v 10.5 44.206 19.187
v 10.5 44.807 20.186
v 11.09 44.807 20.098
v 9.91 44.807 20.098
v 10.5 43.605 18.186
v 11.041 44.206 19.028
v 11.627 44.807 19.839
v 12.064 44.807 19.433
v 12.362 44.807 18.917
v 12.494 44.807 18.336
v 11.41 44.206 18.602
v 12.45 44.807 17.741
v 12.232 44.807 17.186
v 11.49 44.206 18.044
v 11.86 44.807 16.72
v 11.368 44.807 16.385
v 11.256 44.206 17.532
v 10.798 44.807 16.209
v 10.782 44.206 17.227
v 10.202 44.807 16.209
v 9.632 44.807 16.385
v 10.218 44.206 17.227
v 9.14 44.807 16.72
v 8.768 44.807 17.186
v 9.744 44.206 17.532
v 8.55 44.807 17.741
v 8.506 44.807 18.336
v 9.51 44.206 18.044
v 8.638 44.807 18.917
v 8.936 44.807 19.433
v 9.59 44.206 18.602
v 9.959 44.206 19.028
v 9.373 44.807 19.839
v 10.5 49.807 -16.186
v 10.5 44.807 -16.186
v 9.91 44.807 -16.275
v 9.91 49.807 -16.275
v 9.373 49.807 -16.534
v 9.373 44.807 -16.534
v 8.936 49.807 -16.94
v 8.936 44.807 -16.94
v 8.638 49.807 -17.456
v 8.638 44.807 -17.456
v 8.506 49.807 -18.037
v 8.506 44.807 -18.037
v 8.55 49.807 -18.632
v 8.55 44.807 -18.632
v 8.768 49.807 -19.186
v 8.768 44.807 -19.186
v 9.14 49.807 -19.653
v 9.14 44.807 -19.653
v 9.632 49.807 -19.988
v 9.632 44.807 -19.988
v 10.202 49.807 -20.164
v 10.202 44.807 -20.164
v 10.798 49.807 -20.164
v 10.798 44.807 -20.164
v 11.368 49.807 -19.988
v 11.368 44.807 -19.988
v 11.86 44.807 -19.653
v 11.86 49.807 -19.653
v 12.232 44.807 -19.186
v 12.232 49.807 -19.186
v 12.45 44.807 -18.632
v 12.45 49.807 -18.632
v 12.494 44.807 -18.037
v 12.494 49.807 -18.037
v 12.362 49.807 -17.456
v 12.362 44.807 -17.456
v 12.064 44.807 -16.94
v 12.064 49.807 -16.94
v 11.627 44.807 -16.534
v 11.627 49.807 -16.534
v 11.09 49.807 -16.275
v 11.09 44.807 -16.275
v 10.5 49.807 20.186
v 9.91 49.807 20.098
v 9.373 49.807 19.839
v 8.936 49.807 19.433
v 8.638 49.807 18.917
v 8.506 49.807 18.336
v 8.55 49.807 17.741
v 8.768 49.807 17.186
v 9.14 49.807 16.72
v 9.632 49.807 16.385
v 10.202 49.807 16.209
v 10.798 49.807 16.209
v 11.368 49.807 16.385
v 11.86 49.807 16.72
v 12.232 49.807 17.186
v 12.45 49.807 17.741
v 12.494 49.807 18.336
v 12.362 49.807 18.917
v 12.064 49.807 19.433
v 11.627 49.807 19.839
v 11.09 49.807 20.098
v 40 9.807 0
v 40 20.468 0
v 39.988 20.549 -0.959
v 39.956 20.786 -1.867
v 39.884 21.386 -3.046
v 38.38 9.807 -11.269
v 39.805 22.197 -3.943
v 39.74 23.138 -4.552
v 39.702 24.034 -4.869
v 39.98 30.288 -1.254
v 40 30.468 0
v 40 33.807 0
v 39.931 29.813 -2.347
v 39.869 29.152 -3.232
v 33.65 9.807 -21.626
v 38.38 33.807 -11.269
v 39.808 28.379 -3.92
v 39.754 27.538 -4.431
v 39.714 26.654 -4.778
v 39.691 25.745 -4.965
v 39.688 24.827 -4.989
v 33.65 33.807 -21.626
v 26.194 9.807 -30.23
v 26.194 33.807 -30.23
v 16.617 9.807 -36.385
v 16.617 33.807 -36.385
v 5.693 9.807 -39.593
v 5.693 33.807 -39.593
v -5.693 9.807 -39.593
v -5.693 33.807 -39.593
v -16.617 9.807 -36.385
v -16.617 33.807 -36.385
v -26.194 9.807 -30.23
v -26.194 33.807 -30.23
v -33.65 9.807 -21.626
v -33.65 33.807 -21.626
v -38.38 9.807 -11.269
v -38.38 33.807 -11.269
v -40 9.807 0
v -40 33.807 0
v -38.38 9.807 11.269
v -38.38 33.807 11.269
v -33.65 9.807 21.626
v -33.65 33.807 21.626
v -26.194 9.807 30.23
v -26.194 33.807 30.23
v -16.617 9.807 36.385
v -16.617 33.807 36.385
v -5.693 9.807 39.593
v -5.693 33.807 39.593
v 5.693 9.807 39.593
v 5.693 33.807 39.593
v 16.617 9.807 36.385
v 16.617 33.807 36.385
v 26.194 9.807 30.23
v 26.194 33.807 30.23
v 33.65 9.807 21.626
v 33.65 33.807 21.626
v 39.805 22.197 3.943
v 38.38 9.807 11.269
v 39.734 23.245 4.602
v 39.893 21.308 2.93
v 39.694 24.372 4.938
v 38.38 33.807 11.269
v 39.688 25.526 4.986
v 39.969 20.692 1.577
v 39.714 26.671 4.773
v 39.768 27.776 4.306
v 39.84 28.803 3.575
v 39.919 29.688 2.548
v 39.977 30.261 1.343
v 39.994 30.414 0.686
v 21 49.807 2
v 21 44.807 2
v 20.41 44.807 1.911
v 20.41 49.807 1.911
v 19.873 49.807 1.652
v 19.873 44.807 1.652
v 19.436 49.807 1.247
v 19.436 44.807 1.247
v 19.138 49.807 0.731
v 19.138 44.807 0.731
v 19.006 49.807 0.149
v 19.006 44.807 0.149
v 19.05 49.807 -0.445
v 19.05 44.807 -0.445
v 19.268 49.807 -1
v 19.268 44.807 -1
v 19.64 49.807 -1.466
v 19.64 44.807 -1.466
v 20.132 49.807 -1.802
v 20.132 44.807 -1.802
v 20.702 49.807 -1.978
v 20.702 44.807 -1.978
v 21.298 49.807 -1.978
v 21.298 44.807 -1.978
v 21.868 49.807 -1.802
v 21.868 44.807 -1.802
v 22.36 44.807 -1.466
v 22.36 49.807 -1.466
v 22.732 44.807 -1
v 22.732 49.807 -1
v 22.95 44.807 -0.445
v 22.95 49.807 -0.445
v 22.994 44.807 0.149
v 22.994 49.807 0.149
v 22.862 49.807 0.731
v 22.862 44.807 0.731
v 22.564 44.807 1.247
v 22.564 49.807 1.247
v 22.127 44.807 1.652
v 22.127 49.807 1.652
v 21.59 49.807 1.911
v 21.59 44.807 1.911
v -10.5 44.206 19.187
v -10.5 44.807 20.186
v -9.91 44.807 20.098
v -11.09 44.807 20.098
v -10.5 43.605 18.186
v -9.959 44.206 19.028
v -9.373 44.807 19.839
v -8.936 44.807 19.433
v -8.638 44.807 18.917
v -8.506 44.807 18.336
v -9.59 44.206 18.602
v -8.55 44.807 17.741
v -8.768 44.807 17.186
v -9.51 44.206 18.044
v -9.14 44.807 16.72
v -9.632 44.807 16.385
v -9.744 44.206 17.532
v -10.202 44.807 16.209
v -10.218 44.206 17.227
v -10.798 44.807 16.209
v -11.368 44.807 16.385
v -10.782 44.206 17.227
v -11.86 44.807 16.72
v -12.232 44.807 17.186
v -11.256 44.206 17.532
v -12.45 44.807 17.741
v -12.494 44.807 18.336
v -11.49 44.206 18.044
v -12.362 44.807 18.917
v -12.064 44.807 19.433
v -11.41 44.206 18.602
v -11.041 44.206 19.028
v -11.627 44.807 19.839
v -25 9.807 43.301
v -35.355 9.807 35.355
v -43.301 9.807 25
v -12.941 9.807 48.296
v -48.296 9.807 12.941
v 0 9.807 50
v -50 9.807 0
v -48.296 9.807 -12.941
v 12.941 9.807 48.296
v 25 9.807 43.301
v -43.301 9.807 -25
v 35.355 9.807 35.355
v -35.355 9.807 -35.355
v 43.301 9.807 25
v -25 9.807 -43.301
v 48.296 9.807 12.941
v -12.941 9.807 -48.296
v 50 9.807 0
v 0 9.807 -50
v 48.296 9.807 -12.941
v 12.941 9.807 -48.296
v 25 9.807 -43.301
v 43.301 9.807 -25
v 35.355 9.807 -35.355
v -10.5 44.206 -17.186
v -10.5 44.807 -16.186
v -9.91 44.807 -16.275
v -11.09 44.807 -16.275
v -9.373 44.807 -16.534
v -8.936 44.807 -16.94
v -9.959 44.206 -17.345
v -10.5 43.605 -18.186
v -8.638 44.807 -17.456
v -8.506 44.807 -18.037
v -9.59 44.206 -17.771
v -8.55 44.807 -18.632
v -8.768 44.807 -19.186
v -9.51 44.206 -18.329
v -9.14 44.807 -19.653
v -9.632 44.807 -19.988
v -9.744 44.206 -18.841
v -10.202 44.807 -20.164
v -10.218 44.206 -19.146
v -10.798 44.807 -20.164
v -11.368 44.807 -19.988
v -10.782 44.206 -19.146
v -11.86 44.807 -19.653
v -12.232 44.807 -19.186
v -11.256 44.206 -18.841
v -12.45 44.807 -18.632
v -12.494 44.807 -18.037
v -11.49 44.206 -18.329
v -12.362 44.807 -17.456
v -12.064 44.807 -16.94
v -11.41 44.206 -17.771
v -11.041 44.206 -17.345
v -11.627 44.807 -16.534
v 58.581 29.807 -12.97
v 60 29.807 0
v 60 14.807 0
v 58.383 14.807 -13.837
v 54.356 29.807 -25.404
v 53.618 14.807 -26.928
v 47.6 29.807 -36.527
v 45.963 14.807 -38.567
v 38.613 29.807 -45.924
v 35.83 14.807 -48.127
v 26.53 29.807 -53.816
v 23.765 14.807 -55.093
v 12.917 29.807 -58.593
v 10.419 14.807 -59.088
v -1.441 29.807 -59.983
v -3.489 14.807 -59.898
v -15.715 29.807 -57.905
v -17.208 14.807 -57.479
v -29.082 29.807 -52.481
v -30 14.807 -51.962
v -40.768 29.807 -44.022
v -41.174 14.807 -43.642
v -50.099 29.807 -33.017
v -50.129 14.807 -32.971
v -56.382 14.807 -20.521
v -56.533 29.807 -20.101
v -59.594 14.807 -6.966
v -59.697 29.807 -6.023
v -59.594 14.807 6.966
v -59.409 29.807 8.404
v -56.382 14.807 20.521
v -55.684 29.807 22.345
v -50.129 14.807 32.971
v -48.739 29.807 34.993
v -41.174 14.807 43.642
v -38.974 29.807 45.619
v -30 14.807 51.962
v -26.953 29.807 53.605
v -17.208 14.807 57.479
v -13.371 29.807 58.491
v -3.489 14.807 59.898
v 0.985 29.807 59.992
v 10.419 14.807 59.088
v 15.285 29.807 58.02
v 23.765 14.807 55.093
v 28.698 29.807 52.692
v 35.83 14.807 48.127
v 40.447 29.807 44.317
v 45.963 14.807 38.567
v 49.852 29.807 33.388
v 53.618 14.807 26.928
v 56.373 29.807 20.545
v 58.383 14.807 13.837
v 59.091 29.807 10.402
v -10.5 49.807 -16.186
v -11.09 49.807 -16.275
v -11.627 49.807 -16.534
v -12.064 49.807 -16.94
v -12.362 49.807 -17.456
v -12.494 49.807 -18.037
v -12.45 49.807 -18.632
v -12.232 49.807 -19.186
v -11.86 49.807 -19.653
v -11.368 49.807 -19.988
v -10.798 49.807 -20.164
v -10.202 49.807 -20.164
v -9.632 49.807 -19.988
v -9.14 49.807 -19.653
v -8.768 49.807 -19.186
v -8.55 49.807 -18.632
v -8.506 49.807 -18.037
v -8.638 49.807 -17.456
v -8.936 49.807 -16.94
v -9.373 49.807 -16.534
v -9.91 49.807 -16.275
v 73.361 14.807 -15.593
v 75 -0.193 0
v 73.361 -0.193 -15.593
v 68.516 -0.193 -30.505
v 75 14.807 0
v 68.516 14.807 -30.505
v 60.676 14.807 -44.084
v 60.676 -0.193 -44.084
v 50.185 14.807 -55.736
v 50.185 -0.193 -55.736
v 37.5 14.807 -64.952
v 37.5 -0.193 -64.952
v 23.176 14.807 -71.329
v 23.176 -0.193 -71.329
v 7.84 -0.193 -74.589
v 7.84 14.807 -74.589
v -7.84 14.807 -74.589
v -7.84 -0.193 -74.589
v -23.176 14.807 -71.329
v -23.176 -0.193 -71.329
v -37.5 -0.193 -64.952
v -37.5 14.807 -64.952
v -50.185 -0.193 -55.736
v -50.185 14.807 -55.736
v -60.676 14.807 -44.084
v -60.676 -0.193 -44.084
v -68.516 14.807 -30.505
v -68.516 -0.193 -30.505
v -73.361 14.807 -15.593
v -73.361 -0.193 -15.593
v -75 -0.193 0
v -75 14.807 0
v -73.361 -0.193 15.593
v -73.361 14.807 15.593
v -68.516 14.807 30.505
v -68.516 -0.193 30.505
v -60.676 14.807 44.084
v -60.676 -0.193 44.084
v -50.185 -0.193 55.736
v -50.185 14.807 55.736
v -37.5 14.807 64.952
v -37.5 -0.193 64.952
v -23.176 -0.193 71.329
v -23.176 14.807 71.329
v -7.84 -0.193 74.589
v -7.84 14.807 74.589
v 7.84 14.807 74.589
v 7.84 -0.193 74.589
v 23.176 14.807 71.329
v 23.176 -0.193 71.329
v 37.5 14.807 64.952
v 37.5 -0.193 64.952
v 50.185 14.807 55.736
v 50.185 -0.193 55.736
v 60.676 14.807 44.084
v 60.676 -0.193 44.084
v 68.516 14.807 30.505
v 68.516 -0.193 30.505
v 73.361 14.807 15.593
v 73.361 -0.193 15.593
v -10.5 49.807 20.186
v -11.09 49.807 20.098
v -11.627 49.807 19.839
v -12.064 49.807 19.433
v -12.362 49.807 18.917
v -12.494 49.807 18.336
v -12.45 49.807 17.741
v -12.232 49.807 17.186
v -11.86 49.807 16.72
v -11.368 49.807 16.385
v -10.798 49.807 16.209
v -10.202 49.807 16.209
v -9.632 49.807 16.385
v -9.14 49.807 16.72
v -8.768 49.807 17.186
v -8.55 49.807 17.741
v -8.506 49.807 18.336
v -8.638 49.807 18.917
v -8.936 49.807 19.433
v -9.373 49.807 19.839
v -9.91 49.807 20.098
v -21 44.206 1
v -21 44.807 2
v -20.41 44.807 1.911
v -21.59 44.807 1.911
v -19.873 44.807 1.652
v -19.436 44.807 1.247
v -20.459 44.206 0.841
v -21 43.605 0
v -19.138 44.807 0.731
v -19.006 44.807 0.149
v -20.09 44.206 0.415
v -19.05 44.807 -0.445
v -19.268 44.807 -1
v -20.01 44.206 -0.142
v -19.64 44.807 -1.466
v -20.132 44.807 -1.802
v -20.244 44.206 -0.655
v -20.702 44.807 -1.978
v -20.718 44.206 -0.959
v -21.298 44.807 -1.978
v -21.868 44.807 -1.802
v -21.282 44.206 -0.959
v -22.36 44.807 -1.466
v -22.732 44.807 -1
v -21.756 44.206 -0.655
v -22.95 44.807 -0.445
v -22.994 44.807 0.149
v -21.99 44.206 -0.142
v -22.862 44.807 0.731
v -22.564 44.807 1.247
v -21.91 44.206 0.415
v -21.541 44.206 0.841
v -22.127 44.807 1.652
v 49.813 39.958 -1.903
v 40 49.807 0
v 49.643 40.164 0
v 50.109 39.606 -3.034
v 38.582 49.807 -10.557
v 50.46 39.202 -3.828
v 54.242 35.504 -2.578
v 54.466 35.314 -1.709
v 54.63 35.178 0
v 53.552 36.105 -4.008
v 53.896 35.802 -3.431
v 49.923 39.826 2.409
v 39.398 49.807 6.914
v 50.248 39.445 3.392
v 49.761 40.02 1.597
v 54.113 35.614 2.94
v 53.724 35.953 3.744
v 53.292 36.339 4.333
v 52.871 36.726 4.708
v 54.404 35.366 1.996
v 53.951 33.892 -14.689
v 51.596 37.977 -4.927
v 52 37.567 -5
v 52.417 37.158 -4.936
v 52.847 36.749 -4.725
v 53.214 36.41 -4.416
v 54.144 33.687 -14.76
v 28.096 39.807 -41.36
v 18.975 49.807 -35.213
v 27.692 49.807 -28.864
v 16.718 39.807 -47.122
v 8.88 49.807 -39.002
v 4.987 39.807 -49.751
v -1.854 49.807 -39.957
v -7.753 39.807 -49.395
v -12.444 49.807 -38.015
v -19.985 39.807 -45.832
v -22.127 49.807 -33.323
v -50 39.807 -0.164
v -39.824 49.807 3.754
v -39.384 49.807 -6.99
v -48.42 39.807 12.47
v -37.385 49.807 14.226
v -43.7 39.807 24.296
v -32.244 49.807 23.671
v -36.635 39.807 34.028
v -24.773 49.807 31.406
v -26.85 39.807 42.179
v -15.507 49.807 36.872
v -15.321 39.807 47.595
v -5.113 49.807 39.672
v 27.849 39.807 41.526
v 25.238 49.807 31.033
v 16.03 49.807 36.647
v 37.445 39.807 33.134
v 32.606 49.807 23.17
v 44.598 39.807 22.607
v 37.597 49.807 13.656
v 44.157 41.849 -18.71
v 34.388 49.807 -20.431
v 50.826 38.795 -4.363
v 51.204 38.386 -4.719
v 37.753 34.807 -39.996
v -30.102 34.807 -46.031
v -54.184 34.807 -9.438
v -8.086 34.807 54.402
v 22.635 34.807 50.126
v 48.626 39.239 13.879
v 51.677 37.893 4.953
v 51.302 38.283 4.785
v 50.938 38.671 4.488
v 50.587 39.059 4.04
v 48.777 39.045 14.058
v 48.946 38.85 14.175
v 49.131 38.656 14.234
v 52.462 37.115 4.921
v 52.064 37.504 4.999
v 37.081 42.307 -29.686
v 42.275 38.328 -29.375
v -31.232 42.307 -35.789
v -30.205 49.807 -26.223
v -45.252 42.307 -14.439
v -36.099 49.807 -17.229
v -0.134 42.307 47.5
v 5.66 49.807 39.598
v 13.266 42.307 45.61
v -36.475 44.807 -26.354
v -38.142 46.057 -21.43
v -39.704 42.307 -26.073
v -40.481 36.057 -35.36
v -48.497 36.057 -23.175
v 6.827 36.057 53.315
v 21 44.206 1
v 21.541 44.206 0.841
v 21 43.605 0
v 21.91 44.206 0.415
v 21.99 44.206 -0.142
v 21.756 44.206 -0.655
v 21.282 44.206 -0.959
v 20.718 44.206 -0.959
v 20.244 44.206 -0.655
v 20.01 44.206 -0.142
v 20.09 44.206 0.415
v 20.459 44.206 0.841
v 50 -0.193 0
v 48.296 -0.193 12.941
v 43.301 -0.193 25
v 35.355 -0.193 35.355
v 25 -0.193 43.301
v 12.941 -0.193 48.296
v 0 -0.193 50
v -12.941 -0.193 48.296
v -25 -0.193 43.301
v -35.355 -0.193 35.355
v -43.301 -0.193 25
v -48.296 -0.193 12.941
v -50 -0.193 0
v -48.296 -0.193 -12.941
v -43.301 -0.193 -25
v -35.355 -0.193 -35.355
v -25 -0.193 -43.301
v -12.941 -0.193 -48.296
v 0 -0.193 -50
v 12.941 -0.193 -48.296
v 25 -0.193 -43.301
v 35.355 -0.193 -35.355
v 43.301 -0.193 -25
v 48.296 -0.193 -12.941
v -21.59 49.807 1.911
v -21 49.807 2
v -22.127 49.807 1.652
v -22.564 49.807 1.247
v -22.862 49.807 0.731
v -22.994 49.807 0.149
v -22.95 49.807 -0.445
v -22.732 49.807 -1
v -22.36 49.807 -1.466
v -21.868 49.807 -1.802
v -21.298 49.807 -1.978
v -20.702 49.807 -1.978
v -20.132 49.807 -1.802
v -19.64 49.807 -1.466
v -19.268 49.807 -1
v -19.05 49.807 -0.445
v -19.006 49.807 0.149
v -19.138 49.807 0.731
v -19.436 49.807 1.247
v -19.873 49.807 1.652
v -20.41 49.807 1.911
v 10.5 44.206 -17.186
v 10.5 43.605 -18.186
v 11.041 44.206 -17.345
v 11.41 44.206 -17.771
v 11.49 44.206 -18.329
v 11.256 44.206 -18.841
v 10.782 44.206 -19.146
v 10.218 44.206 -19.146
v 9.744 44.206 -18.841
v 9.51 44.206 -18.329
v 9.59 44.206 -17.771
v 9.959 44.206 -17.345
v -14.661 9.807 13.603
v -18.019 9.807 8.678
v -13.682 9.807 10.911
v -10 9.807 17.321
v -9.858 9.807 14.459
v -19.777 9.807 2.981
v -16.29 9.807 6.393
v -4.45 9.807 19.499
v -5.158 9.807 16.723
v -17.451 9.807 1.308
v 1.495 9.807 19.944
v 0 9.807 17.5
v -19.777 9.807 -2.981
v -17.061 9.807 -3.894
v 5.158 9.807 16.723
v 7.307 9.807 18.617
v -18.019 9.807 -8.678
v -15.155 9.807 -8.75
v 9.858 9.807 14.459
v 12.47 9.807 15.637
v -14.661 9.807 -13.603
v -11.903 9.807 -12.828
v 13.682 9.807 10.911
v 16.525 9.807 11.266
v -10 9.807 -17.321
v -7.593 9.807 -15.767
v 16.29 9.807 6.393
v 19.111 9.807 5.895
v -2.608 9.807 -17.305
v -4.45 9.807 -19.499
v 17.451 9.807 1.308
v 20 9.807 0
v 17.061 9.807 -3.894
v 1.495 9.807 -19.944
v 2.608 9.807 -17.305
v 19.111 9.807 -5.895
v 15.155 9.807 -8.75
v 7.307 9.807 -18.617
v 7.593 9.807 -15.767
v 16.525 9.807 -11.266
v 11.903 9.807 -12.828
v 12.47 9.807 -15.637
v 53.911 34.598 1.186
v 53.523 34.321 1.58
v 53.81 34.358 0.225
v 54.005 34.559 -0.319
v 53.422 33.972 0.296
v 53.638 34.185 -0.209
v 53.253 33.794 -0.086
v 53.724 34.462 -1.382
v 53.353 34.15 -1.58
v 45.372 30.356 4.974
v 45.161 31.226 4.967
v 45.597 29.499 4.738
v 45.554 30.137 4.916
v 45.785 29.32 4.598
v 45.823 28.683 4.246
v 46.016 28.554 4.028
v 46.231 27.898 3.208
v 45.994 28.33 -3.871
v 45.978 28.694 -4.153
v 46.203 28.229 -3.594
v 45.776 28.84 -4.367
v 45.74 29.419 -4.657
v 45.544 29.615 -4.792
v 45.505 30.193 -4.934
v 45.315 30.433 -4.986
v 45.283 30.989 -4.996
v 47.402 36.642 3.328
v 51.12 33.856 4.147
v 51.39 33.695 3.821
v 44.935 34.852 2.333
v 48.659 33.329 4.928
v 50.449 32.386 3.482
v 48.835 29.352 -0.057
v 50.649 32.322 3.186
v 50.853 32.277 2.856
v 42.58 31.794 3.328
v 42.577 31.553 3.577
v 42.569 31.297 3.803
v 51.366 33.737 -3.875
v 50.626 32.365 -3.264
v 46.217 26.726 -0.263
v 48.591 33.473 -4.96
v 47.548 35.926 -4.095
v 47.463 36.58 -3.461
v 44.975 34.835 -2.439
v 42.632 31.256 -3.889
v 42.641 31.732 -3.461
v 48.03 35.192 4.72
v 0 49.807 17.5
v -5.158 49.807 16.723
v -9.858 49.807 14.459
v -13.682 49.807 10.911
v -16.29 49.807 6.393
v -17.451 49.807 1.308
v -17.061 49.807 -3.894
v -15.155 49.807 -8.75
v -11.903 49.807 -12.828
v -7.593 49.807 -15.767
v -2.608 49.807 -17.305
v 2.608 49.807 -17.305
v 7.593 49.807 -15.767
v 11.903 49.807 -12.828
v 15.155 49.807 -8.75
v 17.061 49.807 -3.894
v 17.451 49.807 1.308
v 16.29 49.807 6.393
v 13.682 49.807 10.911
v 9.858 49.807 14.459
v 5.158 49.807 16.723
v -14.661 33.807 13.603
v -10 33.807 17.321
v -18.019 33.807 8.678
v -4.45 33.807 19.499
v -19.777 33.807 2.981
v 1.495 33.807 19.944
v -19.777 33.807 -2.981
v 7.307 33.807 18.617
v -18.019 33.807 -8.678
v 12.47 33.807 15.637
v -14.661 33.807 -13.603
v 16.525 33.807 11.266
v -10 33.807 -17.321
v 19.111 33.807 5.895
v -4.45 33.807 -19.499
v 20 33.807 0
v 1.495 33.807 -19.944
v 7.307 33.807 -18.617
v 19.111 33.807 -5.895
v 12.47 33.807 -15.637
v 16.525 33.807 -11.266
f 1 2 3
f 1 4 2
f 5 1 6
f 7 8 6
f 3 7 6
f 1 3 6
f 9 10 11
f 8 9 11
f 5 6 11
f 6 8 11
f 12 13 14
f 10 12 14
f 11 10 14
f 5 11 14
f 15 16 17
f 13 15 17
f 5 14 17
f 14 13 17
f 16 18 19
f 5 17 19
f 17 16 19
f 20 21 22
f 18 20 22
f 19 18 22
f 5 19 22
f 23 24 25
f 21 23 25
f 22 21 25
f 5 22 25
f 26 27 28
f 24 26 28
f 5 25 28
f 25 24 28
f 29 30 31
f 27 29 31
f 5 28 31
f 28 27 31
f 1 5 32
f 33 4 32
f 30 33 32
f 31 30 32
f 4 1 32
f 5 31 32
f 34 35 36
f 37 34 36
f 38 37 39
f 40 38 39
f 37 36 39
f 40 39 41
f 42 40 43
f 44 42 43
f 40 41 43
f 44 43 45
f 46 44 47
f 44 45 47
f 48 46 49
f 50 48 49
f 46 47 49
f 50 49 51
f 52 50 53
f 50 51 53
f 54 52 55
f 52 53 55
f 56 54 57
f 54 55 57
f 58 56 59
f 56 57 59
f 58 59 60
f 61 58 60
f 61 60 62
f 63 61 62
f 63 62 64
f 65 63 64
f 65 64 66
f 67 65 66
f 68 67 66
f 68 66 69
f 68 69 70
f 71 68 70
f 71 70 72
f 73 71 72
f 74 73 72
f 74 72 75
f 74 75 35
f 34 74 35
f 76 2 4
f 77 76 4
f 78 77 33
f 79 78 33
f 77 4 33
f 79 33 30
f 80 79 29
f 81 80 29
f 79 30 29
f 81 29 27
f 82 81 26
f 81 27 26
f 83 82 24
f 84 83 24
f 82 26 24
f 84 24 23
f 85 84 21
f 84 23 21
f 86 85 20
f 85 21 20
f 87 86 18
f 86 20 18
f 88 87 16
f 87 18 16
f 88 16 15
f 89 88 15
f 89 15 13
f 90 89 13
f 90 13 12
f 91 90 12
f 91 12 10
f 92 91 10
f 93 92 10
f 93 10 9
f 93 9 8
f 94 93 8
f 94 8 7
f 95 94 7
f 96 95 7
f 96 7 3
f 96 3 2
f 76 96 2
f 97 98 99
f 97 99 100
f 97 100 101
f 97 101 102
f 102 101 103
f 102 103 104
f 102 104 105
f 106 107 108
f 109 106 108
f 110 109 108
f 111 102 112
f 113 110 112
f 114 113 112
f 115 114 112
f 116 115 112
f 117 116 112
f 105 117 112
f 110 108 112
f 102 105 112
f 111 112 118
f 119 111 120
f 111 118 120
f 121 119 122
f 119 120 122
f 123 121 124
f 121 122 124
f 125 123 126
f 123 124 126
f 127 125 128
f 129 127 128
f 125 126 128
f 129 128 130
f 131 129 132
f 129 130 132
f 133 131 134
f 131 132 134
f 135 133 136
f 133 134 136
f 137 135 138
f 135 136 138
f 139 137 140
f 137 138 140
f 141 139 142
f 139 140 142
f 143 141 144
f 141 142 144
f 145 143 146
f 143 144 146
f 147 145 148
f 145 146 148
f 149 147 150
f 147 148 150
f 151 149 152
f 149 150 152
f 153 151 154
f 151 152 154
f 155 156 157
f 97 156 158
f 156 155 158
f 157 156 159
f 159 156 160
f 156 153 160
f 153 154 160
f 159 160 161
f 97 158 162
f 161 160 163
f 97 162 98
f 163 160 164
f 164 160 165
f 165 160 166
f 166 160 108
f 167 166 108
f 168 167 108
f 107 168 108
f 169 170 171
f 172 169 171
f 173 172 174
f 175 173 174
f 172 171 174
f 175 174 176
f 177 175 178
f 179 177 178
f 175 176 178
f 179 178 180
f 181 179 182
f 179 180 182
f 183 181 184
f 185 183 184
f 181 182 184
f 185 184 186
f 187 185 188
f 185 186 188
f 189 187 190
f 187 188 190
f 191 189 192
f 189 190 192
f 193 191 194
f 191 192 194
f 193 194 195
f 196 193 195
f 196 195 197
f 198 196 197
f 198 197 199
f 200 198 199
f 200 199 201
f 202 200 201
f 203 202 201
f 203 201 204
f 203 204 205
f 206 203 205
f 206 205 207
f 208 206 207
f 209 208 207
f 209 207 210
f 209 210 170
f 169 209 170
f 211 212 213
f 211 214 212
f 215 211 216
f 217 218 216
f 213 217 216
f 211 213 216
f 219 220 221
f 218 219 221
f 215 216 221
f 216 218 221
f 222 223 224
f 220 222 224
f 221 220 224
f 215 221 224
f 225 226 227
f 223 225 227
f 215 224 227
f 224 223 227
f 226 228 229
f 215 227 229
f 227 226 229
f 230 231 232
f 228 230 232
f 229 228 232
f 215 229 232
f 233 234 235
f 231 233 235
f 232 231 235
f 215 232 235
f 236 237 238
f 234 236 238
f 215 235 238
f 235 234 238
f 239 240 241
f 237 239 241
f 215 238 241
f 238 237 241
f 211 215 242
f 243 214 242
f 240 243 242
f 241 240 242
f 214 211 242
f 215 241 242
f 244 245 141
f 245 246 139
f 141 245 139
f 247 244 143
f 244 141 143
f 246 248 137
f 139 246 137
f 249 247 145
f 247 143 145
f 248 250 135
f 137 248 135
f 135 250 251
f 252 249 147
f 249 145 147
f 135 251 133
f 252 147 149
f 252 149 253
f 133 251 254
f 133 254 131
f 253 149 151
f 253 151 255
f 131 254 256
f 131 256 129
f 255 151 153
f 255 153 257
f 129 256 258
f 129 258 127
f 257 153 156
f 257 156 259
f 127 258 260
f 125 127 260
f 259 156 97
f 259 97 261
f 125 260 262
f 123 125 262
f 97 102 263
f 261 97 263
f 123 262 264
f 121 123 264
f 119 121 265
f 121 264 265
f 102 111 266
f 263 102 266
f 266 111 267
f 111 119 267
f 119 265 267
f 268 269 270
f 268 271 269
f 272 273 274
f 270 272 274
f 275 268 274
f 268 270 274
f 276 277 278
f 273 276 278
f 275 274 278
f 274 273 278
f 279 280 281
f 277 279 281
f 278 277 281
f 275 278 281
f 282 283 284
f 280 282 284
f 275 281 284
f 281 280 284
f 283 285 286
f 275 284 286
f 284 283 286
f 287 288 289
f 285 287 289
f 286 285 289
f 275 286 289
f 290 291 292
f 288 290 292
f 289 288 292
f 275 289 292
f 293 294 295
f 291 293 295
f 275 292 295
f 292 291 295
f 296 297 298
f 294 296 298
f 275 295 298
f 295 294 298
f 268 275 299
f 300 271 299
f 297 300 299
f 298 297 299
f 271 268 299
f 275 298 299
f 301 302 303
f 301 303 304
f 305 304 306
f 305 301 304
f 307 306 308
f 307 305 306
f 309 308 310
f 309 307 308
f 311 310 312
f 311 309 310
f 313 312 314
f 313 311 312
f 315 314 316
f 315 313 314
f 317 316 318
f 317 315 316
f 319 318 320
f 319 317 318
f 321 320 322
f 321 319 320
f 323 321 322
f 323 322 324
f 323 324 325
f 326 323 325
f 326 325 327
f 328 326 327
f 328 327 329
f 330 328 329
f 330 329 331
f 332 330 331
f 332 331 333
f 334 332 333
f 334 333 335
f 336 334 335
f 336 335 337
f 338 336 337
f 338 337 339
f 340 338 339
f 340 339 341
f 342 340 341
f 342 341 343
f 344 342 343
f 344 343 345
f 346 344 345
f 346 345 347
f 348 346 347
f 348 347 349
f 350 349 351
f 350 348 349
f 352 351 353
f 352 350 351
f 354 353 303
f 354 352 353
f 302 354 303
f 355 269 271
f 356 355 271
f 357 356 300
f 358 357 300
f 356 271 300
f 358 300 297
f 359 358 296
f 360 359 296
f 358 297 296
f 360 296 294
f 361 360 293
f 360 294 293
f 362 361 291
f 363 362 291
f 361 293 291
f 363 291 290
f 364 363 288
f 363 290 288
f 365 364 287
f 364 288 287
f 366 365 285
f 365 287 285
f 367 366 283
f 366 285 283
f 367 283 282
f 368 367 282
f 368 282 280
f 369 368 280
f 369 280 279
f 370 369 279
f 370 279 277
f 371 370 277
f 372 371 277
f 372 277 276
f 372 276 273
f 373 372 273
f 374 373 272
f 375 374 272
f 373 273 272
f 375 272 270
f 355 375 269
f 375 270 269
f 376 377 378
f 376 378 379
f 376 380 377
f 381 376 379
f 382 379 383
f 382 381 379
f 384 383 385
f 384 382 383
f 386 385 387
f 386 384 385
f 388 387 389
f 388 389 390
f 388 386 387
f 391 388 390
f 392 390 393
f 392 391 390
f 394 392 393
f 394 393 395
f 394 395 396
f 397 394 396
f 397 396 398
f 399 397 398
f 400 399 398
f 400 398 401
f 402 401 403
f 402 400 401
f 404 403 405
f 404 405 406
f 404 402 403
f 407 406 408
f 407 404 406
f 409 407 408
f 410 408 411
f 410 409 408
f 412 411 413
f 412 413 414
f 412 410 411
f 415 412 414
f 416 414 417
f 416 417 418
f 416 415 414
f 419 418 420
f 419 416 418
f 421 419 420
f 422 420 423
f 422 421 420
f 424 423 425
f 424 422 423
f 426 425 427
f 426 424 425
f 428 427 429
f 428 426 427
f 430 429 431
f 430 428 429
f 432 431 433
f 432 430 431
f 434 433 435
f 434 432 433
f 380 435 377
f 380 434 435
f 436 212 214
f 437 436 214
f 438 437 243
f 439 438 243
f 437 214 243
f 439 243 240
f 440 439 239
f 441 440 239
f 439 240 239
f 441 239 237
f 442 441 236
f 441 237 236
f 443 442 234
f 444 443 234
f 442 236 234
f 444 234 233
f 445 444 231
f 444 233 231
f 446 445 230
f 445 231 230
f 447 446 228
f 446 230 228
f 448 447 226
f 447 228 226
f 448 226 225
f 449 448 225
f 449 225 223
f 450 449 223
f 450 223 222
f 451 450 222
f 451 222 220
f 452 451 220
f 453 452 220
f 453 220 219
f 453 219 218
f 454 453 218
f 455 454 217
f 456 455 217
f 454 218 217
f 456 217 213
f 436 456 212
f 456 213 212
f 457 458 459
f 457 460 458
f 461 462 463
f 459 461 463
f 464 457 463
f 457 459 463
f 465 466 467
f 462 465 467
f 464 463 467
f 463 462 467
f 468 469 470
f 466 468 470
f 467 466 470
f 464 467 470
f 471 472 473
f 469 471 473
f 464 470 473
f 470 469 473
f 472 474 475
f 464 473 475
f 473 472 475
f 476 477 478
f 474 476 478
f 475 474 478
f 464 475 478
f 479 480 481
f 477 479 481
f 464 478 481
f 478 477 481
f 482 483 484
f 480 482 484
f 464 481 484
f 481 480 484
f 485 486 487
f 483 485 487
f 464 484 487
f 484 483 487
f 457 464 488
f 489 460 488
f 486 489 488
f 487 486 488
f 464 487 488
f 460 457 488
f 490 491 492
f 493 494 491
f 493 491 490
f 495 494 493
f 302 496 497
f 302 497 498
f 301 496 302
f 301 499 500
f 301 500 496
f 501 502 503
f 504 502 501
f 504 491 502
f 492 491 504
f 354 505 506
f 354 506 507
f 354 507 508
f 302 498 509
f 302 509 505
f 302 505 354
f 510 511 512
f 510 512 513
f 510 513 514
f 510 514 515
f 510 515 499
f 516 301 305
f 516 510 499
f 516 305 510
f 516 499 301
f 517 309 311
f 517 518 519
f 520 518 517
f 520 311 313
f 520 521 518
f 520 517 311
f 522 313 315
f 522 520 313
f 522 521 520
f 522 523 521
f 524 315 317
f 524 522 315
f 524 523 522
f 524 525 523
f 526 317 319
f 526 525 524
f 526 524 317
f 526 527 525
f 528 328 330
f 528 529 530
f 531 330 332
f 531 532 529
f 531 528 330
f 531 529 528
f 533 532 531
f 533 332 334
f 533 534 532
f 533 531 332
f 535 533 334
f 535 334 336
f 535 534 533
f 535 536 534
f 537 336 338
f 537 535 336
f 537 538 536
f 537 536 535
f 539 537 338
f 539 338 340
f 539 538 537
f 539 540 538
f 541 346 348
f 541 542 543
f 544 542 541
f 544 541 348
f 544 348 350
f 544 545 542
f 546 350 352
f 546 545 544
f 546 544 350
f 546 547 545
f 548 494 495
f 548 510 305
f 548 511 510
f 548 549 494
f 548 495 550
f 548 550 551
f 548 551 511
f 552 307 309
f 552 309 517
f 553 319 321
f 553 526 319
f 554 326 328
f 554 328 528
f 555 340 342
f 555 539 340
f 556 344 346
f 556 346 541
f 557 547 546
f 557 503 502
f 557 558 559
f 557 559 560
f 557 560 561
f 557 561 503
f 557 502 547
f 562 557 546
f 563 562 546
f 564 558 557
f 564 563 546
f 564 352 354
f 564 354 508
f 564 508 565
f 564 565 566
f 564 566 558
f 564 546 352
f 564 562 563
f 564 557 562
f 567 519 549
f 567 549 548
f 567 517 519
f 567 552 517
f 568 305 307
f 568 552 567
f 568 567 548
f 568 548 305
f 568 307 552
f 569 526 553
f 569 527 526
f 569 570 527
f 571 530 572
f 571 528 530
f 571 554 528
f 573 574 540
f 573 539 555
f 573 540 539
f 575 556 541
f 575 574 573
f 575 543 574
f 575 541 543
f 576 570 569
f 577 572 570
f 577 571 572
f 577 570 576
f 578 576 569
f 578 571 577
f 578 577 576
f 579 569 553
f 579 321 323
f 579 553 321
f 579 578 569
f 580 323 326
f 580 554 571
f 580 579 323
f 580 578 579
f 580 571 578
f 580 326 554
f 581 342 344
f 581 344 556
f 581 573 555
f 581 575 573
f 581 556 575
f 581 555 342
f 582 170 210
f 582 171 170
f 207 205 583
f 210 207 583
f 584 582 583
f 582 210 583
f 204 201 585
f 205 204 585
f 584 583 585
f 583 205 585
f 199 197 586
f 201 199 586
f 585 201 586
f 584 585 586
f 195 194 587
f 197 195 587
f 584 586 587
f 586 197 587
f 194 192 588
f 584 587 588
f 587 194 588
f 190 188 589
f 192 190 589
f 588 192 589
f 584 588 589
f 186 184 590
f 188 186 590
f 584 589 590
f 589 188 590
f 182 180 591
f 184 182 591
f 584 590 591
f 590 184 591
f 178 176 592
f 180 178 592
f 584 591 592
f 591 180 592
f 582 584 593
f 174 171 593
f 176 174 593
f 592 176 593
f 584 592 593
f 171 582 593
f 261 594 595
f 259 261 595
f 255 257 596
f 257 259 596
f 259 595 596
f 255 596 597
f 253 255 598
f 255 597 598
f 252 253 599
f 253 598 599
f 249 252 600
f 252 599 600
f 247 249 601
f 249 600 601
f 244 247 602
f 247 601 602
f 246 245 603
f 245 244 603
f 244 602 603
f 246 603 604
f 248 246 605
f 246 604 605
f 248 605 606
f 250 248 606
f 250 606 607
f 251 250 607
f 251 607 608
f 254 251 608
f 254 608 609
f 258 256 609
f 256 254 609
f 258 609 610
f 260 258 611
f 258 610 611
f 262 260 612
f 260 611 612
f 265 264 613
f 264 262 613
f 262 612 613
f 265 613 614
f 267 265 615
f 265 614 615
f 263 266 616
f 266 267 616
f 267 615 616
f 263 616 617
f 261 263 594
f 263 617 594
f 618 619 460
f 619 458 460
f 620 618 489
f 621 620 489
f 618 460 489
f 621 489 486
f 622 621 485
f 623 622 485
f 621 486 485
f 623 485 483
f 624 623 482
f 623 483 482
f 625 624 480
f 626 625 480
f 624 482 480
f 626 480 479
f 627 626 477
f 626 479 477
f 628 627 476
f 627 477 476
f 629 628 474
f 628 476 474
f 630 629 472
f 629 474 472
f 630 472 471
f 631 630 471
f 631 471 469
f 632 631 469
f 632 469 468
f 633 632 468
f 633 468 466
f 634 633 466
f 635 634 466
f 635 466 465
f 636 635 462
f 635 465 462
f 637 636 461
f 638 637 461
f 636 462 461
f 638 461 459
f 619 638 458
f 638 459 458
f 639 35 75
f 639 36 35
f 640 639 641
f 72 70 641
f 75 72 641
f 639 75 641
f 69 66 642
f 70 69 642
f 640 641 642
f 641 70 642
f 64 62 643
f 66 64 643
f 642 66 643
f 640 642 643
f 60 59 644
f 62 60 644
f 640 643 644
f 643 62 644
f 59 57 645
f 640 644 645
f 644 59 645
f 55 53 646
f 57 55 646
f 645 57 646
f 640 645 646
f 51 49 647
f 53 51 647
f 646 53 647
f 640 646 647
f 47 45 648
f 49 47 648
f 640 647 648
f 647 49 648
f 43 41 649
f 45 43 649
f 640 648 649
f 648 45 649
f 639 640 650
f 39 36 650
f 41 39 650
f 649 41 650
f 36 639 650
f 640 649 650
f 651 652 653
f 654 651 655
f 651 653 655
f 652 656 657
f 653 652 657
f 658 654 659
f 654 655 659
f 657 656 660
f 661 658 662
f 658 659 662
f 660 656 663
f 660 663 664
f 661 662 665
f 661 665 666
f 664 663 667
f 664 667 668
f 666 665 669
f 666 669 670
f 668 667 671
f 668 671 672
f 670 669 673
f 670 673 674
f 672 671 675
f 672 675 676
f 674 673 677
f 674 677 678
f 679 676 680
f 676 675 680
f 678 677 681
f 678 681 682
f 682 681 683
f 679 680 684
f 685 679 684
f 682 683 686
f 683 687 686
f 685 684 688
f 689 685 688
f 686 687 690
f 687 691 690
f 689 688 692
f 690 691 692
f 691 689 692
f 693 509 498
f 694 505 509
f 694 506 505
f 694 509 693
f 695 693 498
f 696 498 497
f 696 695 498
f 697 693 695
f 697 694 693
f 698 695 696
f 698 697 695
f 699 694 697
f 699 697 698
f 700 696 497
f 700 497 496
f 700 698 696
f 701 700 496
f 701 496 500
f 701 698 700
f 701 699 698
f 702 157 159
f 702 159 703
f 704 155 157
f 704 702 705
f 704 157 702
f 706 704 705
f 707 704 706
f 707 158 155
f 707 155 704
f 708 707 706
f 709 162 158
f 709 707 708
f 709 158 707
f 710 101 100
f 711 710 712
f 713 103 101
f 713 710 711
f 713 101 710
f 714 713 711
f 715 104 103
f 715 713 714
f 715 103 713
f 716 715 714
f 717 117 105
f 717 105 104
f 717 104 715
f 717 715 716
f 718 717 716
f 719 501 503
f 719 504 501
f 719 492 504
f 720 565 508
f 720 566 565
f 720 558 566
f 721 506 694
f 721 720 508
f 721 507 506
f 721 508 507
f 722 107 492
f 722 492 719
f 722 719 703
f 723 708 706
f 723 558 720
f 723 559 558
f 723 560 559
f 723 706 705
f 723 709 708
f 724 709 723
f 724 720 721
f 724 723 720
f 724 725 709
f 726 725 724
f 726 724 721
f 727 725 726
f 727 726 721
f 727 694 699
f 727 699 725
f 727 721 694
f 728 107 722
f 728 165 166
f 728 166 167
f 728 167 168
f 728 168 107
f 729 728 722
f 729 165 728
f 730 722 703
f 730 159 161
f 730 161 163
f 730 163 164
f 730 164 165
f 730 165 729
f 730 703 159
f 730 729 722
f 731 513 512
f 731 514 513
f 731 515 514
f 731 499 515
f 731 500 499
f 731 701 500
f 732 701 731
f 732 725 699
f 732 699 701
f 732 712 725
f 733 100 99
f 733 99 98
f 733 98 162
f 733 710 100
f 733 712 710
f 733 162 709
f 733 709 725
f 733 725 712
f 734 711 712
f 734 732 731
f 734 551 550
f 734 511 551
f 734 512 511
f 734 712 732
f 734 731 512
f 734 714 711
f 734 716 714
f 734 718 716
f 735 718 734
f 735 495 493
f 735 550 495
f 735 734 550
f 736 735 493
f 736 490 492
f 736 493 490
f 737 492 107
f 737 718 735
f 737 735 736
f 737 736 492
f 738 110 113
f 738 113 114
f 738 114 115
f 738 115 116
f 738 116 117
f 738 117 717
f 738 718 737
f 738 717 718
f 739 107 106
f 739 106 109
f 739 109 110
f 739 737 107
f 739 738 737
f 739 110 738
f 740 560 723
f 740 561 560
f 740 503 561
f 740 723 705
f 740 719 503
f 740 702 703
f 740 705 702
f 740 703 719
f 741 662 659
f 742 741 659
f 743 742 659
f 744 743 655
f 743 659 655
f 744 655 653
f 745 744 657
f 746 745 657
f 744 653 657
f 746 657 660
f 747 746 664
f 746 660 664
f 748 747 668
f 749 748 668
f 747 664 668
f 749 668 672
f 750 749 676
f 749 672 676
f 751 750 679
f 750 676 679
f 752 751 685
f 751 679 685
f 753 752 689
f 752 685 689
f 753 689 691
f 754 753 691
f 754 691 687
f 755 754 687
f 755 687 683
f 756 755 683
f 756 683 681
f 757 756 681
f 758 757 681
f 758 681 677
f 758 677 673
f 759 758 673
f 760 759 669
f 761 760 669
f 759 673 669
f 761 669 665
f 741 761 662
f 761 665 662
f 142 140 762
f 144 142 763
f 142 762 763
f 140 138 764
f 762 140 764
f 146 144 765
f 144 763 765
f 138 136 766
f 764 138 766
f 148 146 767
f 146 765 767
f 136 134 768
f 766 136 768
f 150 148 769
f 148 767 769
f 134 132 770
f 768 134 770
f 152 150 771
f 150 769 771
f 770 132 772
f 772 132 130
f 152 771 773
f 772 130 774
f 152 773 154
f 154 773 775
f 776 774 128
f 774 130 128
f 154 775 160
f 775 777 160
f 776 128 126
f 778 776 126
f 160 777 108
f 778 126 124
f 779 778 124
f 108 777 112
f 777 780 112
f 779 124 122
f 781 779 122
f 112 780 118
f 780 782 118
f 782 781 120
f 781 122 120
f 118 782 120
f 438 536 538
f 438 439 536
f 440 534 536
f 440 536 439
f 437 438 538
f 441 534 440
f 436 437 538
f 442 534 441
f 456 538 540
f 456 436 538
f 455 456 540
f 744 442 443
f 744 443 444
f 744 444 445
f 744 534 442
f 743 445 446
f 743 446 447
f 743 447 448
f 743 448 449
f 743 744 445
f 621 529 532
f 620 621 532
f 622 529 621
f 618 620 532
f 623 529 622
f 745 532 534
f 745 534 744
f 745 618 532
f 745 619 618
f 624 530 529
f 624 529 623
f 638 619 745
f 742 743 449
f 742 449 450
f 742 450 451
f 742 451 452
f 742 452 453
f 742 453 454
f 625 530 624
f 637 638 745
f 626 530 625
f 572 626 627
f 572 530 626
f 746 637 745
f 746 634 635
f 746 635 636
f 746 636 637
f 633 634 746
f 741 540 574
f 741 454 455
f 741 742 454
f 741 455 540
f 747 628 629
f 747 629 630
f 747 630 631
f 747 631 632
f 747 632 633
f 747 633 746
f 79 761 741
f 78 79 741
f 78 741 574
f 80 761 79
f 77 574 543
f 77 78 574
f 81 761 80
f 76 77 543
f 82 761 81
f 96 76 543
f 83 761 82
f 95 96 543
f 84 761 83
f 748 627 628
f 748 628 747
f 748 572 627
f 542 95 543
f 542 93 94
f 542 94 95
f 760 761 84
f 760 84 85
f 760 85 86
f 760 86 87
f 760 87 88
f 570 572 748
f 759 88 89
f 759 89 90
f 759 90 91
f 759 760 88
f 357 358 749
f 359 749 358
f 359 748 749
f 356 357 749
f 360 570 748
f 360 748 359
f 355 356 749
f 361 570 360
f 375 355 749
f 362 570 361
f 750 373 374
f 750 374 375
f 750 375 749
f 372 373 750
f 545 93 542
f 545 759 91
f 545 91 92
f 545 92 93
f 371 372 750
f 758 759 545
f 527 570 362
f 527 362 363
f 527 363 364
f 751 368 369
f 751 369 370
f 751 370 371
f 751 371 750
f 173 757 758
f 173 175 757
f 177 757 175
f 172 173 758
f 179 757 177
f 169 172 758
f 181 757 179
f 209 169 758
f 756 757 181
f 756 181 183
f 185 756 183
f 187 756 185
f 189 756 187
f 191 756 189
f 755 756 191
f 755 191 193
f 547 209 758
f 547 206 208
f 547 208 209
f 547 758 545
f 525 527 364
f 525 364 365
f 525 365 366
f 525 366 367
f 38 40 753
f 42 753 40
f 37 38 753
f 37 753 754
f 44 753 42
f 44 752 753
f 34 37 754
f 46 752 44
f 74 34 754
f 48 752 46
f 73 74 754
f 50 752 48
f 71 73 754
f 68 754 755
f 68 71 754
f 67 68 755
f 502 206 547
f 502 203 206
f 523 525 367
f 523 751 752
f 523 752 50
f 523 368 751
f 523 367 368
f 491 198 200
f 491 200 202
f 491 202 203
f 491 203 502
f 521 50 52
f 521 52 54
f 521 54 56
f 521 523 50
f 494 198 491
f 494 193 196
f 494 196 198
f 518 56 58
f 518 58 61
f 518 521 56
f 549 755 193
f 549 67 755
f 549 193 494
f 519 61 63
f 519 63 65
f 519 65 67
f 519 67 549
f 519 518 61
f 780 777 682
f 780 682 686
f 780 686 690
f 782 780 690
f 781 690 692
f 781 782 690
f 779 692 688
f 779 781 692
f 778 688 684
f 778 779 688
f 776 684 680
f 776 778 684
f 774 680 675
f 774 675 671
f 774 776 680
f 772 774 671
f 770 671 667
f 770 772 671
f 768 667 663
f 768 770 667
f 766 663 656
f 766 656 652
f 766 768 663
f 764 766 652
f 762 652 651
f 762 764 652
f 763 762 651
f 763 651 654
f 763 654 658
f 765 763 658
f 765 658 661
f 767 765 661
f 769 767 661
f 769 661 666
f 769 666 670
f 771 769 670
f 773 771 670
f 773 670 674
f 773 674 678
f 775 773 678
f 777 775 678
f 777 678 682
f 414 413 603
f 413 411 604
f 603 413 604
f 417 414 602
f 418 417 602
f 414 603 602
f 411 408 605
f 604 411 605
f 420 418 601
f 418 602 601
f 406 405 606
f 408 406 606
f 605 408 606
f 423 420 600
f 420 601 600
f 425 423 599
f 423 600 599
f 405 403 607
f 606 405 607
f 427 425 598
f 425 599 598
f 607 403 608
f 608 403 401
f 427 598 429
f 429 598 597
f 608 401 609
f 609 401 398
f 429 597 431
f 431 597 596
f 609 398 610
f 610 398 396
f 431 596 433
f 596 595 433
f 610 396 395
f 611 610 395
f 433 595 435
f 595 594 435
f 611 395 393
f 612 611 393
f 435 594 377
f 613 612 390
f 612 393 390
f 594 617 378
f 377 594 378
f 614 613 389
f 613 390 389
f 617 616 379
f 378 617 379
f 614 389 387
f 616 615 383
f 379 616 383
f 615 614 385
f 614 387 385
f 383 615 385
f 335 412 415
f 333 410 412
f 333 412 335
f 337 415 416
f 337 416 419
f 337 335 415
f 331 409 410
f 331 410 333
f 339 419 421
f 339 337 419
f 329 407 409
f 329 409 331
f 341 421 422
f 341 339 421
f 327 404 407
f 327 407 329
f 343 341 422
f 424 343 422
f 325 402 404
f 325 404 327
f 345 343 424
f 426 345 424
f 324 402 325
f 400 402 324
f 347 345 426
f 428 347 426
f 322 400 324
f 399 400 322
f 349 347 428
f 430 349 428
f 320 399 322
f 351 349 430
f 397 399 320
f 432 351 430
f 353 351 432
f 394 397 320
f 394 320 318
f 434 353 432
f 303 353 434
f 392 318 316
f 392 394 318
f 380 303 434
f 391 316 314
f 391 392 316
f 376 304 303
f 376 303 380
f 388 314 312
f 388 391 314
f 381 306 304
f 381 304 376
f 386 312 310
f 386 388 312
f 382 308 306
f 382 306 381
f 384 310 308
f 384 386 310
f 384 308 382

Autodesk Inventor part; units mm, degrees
ref_plane "XZ Plane" through (0, 0, 0) normal (0, 1, 0) x (-1, 0, 0)
sketch "Sketch1" plane through (0, 0, 0) normal (0, 0, 1) x (1, 0, 0)
  line L0 (0, 0) -> (0, 66)
  line L1 (75, -0.1929) -> (75, 14.8071)
  line L2 (-21.5975, 0) -> (0, 0)
  line L3 (46.9201, 0) -> (53.1744, 0)
  line L4 (75, 14.8071) -> (60, 14.8071)
  line L5 (60, 14.8071) -> (60, 34.8071)
  line L6 (0, 33.8071) -> (0, 49.8071)
  line L7 (0, 49.8071) -> (35, 49.8071)
  line L8 (46.9201, 9.8071) -> (40, 9.8071)
  line L9 (40, 9.8071) -> (40, 33.8071)
  line L10 (60, 34.8071) -> (60, 49.8071)
  line L11 (60, 49.8071) -> (35, 49.8071)
  line L12 (46.9201, 9.8071) -> (50, 9.8071)
  line L13 (50, 9.8071) -> (50, -0.1929)
  line L14 (50, -0.1929) -> (75, -0.1929)
  line L15 (0, 33.8071) -> (0, 9.8071)
  line L16 (0, 9.8071) -> (20, 9.8071)
  line L17 (20, 9.8071) -> (20, 33.8071)
  line L18 (20, 33.8071) -> (40, 33.8071)
  dimension "d0" = 66
  dimension "d2" = 150
  dimension "d4" = 15
  dimension "d5" = 20
  dimension "d15" = 35
  dimension "d16" = 70
  dimension "d84" = 100
  dimension "d92" = 50
  dimension "d132" = 15
  dimension "d134" = 10
  dimension "d136" = 40
  dimension "d137" = 20
revolve "Revolution1" add sketch "Sketch1" angle 360 about axis through (0, 0, 0) along (0, 1, 0)
chamfer "Chamfer1" distance 20 angle 45 1 edges at (-60, 49.8071, 0)
ref_plane "Work Plane1" through (60, 0, 0) normal (1, 0, 0) x (0, 1, 0)
sketch "Sketch10" plane through (0, 49.8071, 0) normal (0, 1, 0) x (1, 0, 0)
  circle A0 centre (0, 0) radius 16
  dimension "d54" = 32
hole "Hole2" at (0, 49.8071, 0) direction (0, -1, 0) diameter 35 end through all
ref_plane "Work Plane2" through (60, 0, 0) normal (1, 0, 0) x (0, 1, 0)
sketch "Sketch14" plane through (60, 0, 0) normal (1, 0, 0) x (0, 1, 0)
  circle A0 centre (45.5775, 0) radius 5
  point P0 (0, 0)
  dimension "d89" = 10
sketch "Sketch15" plane through (0, 0, 0) normal (0, 0, 1) x (1, 0, 0)
  line L0 (59.908, 45.3055) -> (36.1068, 21.3737)
  point P0 (0, 0)
sweep "Sweep4" cut profiles "Sketch14" path "Sketch15"
sketch "Sketch18" plane through (0, 49.8071, 0) normal (0, 1, 0) x (1, 0, 0)
  point P0 (0, 0)
sketch "Sketch19" plane through (0, 49.8071, 0) normal (0, 1, 0) x (1, 0, 0)
  circle A0 centre (-21, 0) radius 2
  circle A1 centre (-10.5, -18.1865) radius 2
  circle A2 centre (10.5, -18.1865) radius 2
  circle A3 centre (21, 0) radius 2
  circle A4 centre (10.5, 18.1865) radius 2
  circle A5 centre (-10.5, 18.1865) radius 2
  point P0 (0, 0)
  dimension "d144" = 4
  dimension "d145" = 21
  dimension "d148" = 360
hole "Hole5" at (-21, 49.8071, 0) at (-10.5, 49.8071, -18.1865) at (21, 49.8071, 0) at (10.5, 49.8071, 18.1865) at (-10.5, 49.8071, 18.1865) at (10.5, 49.8071, -18.1865) direction (0, -1, 0) diameter 4 depth 5 tip angle 118
thread "Thread21"
thread "Thread22"
thread "Thread23"
thread "Thread24"
thread "Thread25"
thread "Thread26"
equation "\"d60\" = Thickness"
equation "\"BendRadius\" = Thickness"
equation "\"BendReliefWidth\" = Thickness"
equation "\"BendReliefDepth\" = 0.5 * Thickness"
equation "\"CornerReliefSize\" = 4 * Thickness"
equation "\"MinimumRemnant\" = 2 * Thickness"
equation "\"TransitionRadius\" = BendRadius"
equation "\"JacobiRadiusSize\" = BendRadius"
equation "\"GapSize\" = Thickness"
equation "\"Thickness\" = 0.5"
properties material "Stainless Steel"
